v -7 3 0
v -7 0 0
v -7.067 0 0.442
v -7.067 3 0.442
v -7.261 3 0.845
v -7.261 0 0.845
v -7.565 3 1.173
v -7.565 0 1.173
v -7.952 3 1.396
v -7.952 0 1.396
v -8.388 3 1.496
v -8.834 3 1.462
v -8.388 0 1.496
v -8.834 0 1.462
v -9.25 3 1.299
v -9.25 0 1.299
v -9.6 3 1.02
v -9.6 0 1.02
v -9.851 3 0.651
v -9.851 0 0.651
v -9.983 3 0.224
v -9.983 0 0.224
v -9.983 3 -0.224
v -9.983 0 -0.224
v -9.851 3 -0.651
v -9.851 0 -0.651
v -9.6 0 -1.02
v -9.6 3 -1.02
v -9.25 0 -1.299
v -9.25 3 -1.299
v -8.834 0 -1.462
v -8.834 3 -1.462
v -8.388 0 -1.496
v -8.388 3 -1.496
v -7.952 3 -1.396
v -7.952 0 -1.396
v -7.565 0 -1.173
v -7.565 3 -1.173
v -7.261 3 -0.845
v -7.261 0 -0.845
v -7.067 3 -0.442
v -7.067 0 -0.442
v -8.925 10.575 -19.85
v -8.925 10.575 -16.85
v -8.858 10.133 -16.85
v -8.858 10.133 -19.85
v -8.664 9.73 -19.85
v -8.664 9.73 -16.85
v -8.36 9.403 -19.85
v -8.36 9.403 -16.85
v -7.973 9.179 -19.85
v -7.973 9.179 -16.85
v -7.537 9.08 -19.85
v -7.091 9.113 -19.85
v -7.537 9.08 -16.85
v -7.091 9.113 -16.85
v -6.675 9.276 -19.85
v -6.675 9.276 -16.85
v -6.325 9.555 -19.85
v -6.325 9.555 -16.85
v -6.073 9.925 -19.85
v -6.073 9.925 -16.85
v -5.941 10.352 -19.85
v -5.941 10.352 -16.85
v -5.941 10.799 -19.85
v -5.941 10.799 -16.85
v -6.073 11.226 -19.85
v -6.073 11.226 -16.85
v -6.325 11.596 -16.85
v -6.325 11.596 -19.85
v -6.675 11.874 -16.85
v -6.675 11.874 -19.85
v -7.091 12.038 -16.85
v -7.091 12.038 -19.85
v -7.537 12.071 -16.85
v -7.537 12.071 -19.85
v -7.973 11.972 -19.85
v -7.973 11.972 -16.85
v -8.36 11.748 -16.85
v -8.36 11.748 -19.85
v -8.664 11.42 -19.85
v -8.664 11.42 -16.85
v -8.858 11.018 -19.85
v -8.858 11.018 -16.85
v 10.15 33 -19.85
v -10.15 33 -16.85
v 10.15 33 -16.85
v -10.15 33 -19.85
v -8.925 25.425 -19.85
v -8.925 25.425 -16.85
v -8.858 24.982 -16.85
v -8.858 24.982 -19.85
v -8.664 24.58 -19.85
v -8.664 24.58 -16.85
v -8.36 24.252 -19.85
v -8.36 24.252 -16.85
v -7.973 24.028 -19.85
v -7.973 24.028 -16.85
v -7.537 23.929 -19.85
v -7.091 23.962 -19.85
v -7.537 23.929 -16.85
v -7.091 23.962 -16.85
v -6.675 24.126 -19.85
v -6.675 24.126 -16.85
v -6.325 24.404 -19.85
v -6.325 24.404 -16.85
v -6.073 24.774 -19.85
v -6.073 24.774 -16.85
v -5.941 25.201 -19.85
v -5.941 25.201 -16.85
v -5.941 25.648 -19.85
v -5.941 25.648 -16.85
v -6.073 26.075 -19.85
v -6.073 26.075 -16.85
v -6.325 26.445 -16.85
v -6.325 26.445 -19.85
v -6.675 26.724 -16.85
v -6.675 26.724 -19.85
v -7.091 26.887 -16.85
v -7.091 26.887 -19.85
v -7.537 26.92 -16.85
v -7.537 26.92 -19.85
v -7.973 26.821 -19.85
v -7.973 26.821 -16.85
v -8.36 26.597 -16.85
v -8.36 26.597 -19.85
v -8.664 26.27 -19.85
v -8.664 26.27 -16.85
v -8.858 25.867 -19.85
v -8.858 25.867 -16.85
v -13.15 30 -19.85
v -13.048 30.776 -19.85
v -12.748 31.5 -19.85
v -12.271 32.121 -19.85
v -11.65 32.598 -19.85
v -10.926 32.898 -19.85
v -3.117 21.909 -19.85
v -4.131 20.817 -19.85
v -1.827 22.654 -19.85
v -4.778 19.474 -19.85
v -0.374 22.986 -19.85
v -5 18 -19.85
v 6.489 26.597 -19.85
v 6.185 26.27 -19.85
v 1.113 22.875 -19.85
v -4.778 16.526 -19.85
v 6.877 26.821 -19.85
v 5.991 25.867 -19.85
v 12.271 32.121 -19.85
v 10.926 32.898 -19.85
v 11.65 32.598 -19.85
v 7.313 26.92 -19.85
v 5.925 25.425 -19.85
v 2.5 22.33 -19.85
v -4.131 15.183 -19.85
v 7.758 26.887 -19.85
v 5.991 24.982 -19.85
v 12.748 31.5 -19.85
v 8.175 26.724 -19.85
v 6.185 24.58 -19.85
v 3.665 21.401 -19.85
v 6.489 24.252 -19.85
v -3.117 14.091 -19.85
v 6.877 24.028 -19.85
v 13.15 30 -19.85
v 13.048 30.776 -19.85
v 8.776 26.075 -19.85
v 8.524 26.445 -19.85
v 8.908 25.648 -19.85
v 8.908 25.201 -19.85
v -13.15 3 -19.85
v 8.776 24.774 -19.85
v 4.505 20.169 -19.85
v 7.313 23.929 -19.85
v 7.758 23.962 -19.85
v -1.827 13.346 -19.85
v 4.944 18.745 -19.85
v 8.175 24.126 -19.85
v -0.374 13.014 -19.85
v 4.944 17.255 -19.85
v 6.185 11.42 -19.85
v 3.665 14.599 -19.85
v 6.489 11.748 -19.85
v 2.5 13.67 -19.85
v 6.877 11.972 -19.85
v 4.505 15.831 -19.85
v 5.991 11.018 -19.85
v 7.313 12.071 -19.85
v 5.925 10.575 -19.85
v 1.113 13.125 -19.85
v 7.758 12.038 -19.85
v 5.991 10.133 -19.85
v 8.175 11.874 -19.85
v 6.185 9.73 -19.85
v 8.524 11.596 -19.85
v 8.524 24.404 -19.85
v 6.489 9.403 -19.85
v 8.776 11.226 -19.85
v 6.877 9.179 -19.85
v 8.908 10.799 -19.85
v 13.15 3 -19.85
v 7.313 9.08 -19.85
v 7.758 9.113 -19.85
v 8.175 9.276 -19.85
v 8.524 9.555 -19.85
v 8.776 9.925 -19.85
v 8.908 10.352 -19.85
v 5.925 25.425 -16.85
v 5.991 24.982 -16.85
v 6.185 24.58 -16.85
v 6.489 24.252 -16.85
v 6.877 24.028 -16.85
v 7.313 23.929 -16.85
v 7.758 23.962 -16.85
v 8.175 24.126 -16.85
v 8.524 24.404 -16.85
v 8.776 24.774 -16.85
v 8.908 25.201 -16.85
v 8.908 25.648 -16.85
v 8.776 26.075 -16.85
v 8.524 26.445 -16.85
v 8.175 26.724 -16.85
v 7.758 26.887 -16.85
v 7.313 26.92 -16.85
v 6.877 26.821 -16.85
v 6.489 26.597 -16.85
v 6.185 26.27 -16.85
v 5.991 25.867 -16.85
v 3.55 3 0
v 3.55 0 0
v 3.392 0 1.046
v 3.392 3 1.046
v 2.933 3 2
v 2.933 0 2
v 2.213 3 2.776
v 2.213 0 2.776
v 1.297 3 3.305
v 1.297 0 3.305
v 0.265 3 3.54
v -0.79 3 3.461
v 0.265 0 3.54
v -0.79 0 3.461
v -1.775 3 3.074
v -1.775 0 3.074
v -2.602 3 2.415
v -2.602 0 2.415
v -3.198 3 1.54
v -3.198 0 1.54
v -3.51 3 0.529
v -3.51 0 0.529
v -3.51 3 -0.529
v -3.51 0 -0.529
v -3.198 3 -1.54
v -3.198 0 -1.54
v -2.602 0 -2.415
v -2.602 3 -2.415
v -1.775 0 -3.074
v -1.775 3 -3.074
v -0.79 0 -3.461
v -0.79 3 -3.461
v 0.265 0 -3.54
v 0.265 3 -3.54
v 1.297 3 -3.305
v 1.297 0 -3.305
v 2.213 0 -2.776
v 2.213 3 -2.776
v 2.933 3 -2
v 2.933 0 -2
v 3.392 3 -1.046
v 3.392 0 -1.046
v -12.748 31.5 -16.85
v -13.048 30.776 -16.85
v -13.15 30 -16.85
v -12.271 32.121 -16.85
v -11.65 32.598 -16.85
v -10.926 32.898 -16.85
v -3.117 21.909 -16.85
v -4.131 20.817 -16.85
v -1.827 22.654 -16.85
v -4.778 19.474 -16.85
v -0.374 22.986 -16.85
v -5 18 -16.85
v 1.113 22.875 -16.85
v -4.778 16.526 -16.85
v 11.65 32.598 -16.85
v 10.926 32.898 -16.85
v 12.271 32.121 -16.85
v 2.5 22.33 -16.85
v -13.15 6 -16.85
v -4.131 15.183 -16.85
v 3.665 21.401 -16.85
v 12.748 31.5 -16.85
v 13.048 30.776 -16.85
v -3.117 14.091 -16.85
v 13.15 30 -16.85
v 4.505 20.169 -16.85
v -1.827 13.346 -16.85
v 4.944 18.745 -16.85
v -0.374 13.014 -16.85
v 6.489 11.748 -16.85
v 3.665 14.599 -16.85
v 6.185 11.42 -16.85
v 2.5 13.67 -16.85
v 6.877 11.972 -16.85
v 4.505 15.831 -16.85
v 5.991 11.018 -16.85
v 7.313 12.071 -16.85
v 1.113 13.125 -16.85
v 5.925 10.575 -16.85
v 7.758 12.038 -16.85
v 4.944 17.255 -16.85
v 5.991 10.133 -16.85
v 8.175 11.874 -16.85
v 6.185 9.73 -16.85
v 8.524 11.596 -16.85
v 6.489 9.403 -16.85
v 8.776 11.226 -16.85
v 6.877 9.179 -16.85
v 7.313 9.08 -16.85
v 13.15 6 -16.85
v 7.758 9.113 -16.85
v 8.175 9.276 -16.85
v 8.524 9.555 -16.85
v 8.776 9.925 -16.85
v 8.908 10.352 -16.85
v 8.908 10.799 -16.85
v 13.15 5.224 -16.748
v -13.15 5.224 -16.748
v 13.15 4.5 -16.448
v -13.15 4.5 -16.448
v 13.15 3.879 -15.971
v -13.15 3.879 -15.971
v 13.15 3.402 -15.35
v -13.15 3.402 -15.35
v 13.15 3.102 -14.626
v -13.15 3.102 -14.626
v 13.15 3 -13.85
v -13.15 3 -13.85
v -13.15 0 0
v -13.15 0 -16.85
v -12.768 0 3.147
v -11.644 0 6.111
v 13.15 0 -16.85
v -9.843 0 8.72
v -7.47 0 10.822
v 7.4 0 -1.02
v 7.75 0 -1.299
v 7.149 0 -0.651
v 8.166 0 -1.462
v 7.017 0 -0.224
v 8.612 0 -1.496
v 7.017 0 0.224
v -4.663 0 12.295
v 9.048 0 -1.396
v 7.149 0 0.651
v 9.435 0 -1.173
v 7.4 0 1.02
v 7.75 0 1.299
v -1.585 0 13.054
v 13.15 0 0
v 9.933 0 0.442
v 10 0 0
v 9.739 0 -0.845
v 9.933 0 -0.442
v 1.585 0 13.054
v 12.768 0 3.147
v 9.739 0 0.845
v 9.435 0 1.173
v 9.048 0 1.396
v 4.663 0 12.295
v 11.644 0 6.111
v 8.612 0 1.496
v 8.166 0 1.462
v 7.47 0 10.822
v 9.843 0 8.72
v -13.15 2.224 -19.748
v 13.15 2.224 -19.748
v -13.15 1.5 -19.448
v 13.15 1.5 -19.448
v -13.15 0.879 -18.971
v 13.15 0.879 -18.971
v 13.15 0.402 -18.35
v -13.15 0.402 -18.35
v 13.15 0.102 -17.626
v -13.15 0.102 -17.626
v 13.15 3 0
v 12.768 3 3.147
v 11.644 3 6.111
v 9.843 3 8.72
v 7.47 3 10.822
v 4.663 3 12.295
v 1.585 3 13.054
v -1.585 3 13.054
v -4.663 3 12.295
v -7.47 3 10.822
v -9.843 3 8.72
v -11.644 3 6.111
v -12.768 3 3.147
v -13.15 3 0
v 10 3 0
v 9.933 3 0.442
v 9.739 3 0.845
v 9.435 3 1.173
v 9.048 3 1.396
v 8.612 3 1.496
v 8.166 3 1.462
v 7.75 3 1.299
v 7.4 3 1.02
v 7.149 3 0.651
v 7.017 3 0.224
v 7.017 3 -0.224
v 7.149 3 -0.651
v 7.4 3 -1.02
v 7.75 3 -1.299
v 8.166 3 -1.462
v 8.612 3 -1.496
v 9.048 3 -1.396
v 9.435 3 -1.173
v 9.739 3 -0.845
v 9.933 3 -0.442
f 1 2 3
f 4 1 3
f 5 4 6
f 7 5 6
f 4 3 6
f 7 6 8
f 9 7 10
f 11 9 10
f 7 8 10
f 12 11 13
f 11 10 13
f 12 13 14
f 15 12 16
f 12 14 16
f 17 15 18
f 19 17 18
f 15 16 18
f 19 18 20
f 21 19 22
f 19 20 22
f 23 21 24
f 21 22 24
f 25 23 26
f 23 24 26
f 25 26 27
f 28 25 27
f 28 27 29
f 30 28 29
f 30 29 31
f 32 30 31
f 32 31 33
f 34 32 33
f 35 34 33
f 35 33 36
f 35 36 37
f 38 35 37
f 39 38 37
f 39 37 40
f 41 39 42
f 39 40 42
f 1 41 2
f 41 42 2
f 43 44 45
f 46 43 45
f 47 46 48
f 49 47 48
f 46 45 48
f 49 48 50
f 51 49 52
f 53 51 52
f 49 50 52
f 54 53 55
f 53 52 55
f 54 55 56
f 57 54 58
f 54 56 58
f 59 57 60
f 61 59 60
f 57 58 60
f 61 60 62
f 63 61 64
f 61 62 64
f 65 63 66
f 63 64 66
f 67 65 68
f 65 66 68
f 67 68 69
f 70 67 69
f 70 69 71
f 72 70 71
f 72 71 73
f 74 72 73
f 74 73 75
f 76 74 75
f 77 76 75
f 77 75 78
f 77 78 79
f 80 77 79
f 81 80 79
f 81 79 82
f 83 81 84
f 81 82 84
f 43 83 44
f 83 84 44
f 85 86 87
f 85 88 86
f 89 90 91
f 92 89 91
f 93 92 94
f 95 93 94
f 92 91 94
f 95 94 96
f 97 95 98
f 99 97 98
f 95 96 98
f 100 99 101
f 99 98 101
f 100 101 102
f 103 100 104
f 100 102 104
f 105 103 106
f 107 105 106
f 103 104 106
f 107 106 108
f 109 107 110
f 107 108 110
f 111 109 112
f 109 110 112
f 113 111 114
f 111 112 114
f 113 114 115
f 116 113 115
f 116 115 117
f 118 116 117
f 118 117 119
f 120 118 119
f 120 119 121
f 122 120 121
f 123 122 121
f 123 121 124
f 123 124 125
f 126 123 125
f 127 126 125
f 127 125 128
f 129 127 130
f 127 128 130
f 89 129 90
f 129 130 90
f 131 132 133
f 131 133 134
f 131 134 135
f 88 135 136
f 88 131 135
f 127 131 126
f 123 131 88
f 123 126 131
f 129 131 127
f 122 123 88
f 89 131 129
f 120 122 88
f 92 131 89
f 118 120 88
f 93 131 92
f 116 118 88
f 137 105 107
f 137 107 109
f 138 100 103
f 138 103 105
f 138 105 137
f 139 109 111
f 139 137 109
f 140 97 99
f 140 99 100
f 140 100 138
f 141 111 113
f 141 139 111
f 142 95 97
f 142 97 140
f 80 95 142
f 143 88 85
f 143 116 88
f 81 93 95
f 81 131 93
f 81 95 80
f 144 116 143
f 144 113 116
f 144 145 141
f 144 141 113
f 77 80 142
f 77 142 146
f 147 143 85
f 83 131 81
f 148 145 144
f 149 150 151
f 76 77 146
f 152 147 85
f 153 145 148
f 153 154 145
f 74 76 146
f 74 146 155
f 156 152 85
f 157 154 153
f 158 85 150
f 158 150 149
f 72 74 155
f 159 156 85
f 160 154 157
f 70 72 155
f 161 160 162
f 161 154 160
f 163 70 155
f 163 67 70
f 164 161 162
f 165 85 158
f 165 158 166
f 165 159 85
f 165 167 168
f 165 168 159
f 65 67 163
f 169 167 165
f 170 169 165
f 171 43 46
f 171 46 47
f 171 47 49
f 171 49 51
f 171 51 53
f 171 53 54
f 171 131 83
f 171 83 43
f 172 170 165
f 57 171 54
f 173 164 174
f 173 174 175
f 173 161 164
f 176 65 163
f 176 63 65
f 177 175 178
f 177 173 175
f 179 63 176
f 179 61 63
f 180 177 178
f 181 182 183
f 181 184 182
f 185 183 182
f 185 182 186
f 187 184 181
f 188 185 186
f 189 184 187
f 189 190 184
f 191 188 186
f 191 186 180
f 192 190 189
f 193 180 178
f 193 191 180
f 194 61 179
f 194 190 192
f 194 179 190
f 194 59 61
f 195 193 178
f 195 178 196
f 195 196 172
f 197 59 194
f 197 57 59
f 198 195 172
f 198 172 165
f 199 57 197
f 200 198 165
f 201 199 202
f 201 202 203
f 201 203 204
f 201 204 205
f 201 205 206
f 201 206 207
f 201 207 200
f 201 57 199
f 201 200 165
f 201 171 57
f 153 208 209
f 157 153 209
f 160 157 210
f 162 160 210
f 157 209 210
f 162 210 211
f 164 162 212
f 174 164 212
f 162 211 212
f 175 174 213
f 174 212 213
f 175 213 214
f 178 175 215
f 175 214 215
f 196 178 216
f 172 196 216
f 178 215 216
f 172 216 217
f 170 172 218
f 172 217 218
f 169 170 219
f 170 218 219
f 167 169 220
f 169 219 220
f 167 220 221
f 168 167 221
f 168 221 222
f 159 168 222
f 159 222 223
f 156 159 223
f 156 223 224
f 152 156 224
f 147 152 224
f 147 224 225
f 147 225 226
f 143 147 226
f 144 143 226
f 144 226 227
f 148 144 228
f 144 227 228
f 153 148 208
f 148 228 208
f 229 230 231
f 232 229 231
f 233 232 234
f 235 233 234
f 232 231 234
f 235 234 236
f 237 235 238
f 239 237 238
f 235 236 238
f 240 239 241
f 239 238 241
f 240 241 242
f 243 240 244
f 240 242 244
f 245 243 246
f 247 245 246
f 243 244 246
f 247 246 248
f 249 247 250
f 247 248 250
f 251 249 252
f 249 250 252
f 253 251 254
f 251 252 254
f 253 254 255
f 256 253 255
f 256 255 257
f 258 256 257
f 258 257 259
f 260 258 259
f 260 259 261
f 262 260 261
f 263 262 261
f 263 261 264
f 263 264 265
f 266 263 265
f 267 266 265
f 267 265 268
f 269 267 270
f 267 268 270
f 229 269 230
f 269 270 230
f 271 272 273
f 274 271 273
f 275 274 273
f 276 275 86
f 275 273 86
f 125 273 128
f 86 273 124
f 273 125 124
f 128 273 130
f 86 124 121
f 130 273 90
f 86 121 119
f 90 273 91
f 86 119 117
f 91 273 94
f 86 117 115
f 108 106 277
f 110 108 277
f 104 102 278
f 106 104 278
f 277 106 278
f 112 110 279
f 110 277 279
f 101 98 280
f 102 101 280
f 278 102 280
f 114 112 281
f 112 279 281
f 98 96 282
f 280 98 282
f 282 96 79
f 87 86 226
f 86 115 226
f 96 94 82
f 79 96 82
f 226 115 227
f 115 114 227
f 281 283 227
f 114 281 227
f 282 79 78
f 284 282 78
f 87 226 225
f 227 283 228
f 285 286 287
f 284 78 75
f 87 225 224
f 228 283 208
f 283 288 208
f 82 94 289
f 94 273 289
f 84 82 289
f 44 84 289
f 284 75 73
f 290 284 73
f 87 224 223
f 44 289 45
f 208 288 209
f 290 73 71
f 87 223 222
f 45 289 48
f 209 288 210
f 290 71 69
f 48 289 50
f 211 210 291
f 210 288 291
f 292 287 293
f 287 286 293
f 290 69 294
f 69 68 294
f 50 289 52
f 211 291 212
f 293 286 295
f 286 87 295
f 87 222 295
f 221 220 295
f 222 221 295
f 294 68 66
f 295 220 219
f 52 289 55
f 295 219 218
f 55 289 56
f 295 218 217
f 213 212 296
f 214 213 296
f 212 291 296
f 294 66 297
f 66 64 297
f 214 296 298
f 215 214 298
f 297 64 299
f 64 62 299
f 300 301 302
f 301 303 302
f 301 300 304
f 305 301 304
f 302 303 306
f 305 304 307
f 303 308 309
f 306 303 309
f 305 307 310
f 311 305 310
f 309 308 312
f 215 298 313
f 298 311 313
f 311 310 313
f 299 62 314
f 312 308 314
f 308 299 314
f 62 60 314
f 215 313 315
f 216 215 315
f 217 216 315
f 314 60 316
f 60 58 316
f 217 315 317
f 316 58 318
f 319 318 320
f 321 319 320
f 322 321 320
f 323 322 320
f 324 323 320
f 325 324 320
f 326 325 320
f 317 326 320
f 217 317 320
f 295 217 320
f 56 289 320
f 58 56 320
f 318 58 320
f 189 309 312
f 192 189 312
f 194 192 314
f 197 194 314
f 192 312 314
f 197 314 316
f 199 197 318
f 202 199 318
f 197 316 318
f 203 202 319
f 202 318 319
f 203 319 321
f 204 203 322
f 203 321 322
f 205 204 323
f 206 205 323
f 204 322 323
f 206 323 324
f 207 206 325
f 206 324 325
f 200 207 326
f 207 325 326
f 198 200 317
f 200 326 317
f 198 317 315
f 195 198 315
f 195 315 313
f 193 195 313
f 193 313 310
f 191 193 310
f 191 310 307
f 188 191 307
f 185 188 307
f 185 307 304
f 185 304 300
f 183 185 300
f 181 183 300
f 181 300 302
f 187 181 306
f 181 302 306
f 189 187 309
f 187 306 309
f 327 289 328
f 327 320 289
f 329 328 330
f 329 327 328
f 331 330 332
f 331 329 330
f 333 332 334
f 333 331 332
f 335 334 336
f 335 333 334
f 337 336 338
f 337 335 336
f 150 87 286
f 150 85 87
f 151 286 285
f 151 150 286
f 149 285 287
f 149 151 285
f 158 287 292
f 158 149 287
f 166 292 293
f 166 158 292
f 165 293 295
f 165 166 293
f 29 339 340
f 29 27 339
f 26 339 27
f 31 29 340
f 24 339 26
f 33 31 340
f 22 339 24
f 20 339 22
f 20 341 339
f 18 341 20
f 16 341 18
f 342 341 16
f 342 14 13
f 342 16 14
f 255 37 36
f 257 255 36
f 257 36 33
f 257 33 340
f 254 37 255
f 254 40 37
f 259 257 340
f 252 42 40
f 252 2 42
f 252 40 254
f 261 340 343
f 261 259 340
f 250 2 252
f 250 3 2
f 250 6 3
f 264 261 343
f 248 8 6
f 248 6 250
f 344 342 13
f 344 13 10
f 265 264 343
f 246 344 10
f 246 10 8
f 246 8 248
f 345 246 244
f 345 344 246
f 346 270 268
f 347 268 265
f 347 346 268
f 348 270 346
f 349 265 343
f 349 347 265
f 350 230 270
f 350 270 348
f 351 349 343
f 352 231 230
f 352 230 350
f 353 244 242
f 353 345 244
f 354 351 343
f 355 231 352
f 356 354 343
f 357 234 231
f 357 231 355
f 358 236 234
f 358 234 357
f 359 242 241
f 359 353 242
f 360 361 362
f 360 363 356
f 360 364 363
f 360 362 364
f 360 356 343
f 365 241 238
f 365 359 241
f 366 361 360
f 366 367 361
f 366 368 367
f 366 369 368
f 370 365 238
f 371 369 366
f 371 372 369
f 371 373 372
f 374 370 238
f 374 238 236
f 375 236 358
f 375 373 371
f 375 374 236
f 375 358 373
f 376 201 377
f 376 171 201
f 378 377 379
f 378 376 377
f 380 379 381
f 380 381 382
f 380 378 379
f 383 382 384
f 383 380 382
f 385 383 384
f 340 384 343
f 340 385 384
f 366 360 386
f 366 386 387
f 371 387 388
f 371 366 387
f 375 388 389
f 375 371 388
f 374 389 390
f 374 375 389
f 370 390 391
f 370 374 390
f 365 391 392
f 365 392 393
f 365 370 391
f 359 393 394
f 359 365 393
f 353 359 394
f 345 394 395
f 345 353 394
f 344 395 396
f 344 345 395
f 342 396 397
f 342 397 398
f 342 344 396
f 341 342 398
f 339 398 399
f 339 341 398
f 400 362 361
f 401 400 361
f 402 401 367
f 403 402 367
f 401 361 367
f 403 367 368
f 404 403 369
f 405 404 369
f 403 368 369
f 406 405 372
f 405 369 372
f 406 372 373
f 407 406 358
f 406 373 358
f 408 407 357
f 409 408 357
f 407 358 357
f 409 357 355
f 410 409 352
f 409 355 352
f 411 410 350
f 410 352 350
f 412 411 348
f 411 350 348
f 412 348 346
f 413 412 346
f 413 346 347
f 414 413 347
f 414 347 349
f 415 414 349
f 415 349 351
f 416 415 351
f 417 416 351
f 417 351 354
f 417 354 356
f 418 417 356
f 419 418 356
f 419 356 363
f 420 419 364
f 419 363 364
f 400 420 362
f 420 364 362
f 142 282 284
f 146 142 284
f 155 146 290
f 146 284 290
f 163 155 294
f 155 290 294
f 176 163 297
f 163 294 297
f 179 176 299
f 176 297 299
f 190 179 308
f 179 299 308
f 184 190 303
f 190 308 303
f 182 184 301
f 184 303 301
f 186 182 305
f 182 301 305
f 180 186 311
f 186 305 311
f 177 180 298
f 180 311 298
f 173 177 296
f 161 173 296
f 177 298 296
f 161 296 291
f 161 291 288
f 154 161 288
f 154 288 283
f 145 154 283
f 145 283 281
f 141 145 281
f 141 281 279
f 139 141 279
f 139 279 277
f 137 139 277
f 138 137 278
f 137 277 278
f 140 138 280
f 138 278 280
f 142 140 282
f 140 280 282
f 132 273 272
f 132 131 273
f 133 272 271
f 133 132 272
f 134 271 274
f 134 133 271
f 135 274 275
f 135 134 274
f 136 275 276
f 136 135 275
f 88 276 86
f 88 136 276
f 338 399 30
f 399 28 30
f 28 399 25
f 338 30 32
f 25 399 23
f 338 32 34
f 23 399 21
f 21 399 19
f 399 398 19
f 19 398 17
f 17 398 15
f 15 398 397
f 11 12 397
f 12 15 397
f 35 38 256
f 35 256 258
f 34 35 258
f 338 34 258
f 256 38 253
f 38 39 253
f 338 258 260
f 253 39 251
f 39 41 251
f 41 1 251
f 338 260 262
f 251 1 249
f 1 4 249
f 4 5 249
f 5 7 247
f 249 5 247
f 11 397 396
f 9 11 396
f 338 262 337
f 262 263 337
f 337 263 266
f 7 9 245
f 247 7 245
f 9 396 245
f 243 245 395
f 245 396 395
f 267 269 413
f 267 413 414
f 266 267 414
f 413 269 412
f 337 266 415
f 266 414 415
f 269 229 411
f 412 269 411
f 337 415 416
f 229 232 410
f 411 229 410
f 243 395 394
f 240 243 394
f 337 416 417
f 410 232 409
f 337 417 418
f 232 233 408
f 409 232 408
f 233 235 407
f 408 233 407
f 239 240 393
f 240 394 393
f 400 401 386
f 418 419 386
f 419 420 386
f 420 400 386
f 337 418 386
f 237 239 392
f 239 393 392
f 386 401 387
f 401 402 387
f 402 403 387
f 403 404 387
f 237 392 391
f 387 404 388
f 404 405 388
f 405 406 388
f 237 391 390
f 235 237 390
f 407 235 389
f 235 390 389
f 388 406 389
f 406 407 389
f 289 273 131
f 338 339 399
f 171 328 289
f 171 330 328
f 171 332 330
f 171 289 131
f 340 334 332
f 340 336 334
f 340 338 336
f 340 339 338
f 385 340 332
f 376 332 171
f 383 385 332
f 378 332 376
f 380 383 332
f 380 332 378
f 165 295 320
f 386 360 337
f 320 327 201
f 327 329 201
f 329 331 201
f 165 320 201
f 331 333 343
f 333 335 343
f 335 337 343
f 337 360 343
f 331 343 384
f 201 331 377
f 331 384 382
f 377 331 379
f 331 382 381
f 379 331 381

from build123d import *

# Parameters (mm, degrees)
SKETCH_R      = 3.55
SKETCH_R_2    = 1.5
PAD_DEPTH     = 3
SKETCH001_W   = 26.3
SKETCH001_H   = 3
PAD001_DEPTH  = 30
SKETCH002_R   = 5
SKETCH002_R_2 = 1.5
POCKET_DEPTH  = 3
FILLET_R      = 3
FILLET001_R   = 3


with BuildPart() as part:
    # Sketch → Pad (new body)
    with BuildSketch(Plane.XZ):
        with BuildLine():
            ThreePointArc((13.15, 0), (0, 13.15), (-13.15, 0))
            Line((-13.15, 0), (-13.15, -19.85))
            Line((13.15, -19.85), (-13.15, -19.85))
            Line((13.15, 0), (13.15, -19.85))
        make_face()
        Circle(SKETCH_R, mode=Mode.SUBTRACT)
        with Locations((8.5, 0)):
            Circle(SKETCH_R_2, mode=Mode.SUBTRACT)
        with Locations((-8.5, 0)):
            Circle(SKETCH_R_2, mode=Mode.SUBTRACT)
    extrude(amount=-PAD_DEPTH)

    # Sketch001 (on Face9 of Pad) → Pad001 (join)
    with BuildSketch(Plane(origin=(0, 3, 0), x_dir=(1, 0, 0), z_dir=(0, 1, 0))):
        with Locations((0, 18.35)):
            Rectangle(SKETCH001_W, SKETCH001_H)
    extrude(amount=PAD001_DEPTH)

    # Sketch002 (on Face7 of Pad001) → Pocket (cut)
    with BuildSketch(Plane(origin=(0, 0, -16.85), x_dir=(-1, 0, 0), z_dir=(0, 0, 1))):
        with Locations((0, -18)):
            Circle(SKETCH002_R)
        with Locations((-7.424621, -25.424621)):
            Circle(SKETCH002_R_2)
        with Locations((7.424621, -25.424621)):
            Circle(SKETCH002_R_2)
        with Locations((7.424621, -10.575379)):
            Circle(SKETCH002_R_2)
        with Locations((-7.424621, -10.575379)):
            Circle(SKETCH002_R_2)
    extrude(amount=-POCKET_DEPTH, mode=Mode.SUBTRACT)

    # Fillet
    fillet_edges = [part.edges().sort_by_distance(p)[0] for p in [
        (13.15, 33, -18.35),
        (-13.15, 33, -18.35),
    ]]
    fillet(fillet_edges, radius=FILLET_R)

    # Fillet001
    fillet001_edges = [part.edges().sort_by_distance(p)[0] for p in [
        (0, 3, -16.85),
        (0, 0, -19.85),
    ]]
    fillet(fillet001_edges, radius=FILLET001_R)


solid = part.part
